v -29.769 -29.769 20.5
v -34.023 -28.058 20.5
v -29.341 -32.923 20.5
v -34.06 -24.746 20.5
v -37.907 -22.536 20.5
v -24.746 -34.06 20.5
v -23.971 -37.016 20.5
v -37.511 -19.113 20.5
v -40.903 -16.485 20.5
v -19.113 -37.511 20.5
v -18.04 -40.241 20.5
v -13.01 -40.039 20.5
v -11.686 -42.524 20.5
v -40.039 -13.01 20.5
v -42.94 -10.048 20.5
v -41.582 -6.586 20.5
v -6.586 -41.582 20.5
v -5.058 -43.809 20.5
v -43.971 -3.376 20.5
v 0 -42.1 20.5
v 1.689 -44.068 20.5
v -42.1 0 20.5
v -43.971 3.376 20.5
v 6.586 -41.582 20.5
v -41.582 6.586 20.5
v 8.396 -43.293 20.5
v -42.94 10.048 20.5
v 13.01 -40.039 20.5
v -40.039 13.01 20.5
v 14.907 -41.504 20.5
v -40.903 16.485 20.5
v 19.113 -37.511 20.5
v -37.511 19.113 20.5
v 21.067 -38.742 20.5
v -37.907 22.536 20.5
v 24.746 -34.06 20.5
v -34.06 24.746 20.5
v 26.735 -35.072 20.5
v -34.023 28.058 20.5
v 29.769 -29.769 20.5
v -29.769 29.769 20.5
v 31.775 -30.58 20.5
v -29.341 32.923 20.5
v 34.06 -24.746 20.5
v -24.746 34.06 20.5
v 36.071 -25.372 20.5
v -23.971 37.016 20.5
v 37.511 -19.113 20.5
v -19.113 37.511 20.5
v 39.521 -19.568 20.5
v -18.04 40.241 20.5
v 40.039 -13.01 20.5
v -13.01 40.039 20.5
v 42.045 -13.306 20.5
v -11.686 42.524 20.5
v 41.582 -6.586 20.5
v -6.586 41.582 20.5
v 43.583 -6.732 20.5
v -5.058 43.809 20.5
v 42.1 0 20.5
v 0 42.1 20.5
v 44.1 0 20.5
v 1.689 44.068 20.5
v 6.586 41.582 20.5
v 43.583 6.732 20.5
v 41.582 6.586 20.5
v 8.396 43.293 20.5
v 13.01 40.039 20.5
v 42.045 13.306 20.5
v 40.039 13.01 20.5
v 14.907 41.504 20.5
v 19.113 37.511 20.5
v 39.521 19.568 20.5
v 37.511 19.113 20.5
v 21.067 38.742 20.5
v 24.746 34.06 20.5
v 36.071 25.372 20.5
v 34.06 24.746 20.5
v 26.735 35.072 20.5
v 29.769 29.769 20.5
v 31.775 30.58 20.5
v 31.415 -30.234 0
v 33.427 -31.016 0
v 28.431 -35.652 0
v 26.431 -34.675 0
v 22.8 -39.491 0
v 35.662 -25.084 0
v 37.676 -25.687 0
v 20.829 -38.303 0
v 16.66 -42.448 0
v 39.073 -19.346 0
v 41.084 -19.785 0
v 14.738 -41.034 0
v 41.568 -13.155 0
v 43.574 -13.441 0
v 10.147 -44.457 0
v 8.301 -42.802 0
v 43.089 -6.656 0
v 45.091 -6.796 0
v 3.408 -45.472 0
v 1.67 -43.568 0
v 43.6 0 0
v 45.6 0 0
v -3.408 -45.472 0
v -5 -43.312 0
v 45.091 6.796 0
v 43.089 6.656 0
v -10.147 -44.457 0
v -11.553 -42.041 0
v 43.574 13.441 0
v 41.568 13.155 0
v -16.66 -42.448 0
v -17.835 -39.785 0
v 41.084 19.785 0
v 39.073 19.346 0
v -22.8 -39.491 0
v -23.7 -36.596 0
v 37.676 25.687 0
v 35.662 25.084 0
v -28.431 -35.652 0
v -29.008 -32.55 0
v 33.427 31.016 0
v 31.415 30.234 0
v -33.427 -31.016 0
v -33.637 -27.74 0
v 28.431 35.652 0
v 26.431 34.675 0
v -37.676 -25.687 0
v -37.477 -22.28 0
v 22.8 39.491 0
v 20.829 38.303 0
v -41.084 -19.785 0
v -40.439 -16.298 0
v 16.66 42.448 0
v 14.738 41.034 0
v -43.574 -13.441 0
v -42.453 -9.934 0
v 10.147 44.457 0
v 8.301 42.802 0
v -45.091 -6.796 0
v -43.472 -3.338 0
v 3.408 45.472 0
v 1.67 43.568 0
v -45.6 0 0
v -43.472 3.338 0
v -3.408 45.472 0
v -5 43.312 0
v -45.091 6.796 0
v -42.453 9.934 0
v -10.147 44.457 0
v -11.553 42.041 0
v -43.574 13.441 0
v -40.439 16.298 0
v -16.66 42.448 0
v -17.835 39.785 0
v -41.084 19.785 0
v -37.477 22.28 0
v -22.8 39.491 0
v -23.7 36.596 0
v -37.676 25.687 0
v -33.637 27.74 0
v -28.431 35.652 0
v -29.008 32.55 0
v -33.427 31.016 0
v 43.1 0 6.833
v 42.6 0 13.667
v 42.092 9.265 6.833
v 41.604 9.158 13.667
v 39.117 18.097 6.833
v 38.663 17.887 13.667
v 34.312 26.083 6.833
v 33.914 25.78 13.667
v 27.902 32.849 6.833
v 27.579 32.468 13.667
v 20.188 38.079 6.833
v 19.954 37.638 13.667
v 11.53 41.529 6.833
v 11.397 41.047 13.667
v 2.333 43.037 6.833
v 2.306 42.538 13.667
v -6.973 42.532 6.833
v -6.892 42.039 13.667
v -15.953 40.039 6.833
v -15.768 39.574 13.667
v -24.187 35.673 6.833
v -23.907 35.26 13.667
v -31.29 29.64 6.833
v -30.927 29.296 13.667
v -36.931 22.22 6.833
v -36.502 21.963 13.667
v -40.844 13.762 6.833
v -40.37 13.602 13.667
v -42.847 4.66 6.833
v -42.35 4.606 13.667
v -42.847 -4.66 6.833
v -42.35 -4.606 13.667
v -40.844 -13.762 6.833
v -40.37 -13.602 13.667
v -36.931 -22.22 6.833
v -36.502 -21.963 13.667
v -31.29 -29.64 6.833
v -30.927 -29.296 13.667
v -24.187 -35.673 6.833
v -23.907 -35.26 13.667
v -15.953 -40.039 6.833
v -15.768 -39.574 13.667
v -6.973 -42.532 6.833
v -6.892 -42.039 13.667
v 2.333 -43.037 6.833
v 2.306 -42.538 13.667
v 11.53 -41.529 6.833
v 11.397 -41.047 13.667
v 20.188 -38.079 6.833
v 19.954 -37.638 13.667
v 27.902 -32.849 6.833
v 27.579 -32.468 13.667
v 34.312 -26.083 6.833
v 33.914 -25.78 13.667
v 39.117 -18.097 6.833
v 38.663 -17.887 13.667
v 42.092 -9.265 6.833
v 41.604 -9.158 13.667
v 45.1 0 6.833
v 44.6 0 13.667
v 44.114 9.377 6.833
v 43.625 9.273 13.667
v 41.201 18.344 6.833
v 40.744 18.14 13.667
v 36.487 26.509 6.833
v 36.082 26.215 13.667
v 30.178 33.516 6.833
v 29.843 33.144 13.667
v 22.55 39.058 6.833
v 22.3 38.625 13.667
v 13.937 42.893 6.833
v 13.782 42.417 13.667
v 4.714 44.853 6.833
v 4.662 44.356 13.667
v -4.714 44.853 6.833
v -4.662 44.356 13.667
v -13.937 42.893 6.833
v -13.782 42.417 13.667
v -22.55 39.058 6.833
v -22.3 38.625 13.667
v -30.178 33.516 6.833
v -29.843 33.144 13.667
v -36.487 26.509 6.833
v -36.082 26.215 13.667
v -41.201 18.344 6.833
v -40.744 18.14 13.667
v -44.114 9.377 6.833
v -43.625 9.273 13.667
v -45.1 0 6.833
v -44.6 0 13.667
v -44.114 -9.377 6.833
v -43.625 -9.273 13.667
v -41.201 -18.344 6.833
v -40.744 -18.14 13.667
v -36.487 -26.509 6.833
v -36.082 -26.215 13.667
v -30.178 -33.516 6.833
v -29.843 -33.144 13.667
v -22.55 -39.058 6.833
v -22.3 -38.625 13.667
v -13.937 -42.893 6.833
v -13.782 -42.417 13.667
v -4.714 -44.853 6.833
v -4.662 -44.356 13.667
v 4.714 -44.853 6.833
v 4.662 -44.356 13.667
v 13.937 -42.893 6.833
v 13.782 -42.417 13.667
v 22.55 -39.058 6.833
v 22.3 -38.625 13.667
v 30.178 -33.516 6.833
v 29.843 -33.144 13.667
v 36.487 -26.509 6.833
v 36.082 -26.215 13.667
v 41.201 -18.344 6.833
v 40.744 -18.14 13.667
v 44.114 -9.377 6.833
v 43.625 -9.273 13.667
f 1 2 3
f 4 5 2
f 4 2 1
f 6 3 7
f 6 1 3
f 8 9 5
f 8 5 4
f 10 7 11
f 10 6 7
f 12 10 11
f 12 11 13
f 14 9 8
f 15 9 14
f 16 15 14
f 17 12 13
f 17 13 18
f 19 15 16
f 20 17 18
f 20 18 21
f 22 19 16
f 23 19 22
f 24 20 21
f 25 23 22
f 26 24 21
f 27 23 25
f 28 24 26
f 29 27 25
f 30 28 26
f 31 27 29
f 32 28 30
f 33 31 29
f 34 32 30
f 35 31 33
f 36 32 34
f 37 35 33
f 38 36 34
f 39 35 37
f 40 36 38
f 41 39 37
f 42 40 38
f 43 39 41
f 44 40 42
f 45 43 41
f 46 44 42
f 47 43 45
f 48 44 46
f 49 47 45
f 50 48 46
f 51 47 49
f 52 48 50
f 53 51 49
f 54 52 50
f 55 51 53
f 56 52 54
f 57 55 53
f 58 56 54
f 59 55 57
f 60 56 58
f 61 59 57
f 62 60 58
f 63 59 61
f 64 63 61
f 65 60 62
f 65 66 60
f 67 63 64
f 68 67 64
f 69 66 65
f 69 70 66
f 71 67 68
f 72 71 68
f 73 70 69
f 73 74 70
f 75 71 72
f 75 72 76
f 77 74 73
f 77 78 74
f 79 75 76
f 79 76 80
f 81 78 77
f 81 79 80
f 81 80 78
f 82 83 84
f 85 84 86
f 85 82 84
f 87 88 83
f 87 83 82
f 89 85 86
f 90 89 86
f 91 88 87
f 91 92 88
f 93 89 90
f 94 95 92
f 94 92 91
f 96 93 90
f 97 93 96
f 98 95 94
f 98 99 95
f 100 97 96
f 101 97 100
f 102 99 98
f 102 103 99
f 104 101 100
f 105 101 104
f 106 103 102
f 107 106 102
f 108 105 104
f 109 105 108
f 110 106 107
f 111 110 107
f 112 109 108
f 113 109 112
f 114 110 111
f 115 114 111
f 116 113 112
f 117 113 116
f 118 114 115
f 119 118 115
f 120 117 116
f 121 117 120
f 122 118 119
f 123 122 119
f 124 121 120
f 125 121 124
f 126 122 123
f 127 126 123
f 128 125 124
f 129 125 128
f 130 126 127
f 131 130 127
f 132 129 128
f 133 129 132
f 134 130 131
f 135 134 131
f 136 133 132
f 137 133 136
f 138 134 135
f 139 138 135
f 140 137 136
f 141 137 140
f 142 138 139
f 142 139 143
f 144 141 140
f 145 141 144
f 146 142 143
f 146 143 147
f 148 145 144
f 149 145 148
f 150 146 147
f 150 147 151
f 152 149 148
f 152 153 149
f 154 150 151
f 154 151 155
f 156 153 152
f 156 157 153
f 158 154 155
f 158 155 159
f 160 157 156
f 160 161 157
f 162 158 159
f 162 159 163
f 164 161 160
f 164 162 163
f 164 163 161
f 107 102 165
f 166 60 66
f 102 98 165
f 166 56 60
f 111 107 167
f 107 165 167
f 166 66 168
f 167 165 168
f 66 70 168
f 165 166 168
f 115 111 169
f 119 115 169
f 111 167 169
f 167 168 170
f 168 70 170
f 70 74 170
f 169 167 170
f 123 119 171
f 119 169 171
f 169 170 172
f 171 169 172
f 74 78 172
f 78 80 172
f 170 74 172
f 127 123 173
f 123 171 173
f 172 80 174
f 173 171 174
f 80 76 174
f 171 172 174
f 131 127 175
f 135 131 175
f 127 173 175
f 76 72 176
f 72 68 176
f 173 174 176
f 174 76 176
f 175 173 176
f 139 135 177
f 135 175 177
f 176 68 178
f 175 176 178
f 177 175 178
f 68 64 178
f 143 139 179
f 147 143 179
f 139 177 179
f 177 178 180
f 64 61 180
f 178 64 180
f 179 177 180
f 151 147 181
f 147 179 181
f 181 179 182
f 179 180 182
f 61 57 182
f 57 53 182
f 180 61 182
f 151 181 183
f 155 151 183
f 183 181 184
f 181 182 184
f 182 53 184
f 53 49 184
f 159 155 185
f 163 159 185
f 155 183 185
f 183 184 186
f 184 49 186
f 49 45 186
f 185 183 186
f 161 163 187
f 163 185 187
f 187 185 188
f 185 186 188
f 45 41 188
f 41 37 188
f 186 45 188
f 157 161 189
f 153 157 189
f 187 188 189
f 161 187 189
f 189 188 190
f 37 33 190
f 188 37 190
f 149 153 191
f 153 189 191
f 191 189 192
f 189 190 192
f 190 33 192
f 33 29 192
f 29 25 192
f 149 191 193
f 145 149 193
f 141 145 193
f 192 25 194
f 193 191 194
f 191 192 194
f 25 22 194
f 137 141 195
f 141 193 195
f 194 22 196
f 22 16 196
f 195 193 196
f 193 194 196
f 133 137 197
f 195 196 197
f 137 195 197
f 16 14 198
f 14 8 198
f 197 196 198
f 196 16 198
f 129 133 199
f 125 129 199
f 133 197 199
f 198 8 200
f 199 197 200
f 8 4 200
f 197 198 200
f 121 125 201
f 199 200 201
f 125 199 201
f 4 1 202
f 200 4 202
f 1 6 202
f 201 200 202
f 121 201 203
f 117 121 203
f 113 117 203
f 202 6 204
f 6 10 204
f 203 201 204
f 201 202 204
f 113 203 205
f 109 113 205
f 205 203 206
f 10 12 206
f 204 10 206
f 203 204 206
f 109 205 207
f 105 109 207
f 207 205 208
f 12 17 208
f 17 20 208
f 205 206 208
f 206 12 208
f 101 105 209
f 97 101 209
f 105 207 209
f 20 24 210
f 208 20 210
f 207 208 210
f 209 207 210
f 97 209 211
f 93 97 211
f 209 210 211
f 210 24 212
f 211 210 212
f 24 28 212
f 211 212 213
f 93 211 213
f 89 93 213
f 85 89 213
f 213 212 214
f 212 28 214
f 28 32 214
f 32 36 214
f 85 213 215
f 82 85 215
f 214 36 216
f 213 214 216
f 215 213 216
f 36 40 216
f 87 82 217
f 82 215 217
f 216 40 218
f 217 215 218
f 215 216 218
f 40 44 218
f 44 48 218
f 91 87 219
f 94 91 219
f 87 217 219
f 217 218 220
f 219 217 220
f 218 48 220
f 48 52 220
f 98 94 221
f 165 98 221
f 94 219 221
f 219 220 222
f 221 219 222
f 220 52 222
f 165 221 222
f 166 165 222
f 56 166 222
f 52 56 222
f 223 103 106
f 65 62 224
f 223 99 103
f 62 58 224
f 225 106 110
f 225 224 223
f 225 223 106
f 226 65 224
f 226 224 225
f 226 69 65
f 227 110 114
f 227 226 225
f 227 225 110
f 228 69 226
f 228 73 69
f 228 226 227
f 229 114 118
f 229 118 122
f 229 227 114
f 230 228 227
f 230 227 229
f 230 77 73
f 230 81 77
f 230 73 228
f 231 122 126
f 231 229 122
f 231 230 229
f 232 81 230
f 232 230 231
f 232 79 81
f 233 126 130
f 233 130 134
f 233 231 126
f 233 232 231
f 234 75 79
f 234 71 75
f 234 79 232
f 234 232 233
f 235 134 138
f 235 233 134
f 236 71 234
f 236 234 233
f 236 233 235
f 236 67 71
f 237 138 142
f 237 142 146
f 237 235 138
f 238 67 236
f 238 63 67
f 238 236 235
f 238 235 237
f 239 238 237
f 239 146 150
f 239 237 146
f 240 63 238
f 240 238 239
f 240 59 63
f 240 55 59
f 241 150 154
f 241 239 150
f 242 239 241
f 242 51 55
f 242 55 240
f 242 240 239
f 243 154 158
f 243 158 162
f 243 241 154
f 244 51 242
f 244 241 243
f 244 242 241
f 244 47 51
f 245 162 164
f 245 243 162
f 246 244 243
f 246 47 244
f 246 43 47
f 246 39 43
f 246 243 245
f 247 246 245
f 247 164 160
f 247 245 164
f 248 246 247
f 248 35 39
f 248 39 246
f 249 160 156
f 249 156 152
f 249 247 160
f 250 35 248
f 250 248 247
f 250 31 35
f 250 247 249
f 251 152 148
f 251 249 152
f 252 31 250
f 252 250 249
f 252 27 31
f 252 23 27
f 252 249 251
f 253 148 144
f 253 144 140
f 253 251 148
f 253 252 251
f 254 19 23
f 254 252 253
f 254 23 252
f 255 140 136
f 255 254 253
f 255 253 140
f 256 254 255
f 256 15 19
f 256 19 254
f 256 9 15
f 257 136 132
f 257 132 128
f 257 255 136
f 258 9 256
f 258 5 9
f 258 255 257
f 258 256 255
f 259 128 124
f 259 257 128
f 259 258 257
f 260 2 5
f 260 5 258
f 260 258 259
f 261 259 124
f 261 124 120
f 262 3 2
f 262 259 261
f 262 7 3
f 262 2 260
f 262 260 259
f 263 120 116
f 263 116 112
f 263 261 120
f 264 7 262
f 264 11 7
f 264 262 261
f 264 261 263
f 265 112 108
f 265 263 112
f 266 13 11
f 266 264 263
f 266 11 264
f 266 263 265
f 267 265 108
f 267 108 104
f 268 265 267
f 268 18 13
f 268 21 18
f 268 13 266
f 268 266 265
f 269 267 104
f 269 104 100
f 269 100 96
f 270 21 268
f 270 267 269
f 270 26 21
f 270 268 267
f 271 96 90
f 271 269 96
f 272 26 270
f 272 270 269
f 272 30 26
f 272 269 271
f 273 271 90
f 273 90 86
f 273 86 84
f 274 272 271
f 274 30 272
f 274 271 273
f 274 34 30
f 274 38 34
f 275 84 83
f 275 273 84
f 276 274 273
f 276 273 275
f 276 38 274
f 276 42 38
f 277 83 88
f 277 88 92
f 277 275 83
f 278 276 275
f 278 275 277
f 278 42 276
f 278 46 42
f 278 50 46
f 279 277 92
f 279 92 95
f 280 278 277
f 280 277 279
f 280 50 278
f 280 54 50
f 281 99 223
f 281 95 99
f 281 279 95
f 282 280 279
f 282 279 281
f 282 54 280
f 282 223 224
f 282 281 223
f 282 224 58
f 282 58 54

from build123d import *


with BuildPart() as cone_chico002:
    # Cone004 → Cone004 (revolve)
    with BuildSketch(Plane.XZ):
        Polygon((0, 0), (43.6, 0), (42.1, 20.5), (0, 20.5), align=None)
    revolve(axis=Axis((0, 0, 0), (0, 0, 1)))


with BuildPart() as cono001:
    # Cone005 → Cone005 (revolve)
    with BuildSketch(Plane.XZ):
        Polygon((0, 0), (45.6, 0), (44.1, 20.5), (0, 20.5), align=None)
    revolve(axis=Axis((0, 0, 0), (0, 0, 1)))

    # Cut015023: cut Cone_chico002
    add(cone_chico002.part, mode=Mode.SUBTRACT)


solid = cono001.part
